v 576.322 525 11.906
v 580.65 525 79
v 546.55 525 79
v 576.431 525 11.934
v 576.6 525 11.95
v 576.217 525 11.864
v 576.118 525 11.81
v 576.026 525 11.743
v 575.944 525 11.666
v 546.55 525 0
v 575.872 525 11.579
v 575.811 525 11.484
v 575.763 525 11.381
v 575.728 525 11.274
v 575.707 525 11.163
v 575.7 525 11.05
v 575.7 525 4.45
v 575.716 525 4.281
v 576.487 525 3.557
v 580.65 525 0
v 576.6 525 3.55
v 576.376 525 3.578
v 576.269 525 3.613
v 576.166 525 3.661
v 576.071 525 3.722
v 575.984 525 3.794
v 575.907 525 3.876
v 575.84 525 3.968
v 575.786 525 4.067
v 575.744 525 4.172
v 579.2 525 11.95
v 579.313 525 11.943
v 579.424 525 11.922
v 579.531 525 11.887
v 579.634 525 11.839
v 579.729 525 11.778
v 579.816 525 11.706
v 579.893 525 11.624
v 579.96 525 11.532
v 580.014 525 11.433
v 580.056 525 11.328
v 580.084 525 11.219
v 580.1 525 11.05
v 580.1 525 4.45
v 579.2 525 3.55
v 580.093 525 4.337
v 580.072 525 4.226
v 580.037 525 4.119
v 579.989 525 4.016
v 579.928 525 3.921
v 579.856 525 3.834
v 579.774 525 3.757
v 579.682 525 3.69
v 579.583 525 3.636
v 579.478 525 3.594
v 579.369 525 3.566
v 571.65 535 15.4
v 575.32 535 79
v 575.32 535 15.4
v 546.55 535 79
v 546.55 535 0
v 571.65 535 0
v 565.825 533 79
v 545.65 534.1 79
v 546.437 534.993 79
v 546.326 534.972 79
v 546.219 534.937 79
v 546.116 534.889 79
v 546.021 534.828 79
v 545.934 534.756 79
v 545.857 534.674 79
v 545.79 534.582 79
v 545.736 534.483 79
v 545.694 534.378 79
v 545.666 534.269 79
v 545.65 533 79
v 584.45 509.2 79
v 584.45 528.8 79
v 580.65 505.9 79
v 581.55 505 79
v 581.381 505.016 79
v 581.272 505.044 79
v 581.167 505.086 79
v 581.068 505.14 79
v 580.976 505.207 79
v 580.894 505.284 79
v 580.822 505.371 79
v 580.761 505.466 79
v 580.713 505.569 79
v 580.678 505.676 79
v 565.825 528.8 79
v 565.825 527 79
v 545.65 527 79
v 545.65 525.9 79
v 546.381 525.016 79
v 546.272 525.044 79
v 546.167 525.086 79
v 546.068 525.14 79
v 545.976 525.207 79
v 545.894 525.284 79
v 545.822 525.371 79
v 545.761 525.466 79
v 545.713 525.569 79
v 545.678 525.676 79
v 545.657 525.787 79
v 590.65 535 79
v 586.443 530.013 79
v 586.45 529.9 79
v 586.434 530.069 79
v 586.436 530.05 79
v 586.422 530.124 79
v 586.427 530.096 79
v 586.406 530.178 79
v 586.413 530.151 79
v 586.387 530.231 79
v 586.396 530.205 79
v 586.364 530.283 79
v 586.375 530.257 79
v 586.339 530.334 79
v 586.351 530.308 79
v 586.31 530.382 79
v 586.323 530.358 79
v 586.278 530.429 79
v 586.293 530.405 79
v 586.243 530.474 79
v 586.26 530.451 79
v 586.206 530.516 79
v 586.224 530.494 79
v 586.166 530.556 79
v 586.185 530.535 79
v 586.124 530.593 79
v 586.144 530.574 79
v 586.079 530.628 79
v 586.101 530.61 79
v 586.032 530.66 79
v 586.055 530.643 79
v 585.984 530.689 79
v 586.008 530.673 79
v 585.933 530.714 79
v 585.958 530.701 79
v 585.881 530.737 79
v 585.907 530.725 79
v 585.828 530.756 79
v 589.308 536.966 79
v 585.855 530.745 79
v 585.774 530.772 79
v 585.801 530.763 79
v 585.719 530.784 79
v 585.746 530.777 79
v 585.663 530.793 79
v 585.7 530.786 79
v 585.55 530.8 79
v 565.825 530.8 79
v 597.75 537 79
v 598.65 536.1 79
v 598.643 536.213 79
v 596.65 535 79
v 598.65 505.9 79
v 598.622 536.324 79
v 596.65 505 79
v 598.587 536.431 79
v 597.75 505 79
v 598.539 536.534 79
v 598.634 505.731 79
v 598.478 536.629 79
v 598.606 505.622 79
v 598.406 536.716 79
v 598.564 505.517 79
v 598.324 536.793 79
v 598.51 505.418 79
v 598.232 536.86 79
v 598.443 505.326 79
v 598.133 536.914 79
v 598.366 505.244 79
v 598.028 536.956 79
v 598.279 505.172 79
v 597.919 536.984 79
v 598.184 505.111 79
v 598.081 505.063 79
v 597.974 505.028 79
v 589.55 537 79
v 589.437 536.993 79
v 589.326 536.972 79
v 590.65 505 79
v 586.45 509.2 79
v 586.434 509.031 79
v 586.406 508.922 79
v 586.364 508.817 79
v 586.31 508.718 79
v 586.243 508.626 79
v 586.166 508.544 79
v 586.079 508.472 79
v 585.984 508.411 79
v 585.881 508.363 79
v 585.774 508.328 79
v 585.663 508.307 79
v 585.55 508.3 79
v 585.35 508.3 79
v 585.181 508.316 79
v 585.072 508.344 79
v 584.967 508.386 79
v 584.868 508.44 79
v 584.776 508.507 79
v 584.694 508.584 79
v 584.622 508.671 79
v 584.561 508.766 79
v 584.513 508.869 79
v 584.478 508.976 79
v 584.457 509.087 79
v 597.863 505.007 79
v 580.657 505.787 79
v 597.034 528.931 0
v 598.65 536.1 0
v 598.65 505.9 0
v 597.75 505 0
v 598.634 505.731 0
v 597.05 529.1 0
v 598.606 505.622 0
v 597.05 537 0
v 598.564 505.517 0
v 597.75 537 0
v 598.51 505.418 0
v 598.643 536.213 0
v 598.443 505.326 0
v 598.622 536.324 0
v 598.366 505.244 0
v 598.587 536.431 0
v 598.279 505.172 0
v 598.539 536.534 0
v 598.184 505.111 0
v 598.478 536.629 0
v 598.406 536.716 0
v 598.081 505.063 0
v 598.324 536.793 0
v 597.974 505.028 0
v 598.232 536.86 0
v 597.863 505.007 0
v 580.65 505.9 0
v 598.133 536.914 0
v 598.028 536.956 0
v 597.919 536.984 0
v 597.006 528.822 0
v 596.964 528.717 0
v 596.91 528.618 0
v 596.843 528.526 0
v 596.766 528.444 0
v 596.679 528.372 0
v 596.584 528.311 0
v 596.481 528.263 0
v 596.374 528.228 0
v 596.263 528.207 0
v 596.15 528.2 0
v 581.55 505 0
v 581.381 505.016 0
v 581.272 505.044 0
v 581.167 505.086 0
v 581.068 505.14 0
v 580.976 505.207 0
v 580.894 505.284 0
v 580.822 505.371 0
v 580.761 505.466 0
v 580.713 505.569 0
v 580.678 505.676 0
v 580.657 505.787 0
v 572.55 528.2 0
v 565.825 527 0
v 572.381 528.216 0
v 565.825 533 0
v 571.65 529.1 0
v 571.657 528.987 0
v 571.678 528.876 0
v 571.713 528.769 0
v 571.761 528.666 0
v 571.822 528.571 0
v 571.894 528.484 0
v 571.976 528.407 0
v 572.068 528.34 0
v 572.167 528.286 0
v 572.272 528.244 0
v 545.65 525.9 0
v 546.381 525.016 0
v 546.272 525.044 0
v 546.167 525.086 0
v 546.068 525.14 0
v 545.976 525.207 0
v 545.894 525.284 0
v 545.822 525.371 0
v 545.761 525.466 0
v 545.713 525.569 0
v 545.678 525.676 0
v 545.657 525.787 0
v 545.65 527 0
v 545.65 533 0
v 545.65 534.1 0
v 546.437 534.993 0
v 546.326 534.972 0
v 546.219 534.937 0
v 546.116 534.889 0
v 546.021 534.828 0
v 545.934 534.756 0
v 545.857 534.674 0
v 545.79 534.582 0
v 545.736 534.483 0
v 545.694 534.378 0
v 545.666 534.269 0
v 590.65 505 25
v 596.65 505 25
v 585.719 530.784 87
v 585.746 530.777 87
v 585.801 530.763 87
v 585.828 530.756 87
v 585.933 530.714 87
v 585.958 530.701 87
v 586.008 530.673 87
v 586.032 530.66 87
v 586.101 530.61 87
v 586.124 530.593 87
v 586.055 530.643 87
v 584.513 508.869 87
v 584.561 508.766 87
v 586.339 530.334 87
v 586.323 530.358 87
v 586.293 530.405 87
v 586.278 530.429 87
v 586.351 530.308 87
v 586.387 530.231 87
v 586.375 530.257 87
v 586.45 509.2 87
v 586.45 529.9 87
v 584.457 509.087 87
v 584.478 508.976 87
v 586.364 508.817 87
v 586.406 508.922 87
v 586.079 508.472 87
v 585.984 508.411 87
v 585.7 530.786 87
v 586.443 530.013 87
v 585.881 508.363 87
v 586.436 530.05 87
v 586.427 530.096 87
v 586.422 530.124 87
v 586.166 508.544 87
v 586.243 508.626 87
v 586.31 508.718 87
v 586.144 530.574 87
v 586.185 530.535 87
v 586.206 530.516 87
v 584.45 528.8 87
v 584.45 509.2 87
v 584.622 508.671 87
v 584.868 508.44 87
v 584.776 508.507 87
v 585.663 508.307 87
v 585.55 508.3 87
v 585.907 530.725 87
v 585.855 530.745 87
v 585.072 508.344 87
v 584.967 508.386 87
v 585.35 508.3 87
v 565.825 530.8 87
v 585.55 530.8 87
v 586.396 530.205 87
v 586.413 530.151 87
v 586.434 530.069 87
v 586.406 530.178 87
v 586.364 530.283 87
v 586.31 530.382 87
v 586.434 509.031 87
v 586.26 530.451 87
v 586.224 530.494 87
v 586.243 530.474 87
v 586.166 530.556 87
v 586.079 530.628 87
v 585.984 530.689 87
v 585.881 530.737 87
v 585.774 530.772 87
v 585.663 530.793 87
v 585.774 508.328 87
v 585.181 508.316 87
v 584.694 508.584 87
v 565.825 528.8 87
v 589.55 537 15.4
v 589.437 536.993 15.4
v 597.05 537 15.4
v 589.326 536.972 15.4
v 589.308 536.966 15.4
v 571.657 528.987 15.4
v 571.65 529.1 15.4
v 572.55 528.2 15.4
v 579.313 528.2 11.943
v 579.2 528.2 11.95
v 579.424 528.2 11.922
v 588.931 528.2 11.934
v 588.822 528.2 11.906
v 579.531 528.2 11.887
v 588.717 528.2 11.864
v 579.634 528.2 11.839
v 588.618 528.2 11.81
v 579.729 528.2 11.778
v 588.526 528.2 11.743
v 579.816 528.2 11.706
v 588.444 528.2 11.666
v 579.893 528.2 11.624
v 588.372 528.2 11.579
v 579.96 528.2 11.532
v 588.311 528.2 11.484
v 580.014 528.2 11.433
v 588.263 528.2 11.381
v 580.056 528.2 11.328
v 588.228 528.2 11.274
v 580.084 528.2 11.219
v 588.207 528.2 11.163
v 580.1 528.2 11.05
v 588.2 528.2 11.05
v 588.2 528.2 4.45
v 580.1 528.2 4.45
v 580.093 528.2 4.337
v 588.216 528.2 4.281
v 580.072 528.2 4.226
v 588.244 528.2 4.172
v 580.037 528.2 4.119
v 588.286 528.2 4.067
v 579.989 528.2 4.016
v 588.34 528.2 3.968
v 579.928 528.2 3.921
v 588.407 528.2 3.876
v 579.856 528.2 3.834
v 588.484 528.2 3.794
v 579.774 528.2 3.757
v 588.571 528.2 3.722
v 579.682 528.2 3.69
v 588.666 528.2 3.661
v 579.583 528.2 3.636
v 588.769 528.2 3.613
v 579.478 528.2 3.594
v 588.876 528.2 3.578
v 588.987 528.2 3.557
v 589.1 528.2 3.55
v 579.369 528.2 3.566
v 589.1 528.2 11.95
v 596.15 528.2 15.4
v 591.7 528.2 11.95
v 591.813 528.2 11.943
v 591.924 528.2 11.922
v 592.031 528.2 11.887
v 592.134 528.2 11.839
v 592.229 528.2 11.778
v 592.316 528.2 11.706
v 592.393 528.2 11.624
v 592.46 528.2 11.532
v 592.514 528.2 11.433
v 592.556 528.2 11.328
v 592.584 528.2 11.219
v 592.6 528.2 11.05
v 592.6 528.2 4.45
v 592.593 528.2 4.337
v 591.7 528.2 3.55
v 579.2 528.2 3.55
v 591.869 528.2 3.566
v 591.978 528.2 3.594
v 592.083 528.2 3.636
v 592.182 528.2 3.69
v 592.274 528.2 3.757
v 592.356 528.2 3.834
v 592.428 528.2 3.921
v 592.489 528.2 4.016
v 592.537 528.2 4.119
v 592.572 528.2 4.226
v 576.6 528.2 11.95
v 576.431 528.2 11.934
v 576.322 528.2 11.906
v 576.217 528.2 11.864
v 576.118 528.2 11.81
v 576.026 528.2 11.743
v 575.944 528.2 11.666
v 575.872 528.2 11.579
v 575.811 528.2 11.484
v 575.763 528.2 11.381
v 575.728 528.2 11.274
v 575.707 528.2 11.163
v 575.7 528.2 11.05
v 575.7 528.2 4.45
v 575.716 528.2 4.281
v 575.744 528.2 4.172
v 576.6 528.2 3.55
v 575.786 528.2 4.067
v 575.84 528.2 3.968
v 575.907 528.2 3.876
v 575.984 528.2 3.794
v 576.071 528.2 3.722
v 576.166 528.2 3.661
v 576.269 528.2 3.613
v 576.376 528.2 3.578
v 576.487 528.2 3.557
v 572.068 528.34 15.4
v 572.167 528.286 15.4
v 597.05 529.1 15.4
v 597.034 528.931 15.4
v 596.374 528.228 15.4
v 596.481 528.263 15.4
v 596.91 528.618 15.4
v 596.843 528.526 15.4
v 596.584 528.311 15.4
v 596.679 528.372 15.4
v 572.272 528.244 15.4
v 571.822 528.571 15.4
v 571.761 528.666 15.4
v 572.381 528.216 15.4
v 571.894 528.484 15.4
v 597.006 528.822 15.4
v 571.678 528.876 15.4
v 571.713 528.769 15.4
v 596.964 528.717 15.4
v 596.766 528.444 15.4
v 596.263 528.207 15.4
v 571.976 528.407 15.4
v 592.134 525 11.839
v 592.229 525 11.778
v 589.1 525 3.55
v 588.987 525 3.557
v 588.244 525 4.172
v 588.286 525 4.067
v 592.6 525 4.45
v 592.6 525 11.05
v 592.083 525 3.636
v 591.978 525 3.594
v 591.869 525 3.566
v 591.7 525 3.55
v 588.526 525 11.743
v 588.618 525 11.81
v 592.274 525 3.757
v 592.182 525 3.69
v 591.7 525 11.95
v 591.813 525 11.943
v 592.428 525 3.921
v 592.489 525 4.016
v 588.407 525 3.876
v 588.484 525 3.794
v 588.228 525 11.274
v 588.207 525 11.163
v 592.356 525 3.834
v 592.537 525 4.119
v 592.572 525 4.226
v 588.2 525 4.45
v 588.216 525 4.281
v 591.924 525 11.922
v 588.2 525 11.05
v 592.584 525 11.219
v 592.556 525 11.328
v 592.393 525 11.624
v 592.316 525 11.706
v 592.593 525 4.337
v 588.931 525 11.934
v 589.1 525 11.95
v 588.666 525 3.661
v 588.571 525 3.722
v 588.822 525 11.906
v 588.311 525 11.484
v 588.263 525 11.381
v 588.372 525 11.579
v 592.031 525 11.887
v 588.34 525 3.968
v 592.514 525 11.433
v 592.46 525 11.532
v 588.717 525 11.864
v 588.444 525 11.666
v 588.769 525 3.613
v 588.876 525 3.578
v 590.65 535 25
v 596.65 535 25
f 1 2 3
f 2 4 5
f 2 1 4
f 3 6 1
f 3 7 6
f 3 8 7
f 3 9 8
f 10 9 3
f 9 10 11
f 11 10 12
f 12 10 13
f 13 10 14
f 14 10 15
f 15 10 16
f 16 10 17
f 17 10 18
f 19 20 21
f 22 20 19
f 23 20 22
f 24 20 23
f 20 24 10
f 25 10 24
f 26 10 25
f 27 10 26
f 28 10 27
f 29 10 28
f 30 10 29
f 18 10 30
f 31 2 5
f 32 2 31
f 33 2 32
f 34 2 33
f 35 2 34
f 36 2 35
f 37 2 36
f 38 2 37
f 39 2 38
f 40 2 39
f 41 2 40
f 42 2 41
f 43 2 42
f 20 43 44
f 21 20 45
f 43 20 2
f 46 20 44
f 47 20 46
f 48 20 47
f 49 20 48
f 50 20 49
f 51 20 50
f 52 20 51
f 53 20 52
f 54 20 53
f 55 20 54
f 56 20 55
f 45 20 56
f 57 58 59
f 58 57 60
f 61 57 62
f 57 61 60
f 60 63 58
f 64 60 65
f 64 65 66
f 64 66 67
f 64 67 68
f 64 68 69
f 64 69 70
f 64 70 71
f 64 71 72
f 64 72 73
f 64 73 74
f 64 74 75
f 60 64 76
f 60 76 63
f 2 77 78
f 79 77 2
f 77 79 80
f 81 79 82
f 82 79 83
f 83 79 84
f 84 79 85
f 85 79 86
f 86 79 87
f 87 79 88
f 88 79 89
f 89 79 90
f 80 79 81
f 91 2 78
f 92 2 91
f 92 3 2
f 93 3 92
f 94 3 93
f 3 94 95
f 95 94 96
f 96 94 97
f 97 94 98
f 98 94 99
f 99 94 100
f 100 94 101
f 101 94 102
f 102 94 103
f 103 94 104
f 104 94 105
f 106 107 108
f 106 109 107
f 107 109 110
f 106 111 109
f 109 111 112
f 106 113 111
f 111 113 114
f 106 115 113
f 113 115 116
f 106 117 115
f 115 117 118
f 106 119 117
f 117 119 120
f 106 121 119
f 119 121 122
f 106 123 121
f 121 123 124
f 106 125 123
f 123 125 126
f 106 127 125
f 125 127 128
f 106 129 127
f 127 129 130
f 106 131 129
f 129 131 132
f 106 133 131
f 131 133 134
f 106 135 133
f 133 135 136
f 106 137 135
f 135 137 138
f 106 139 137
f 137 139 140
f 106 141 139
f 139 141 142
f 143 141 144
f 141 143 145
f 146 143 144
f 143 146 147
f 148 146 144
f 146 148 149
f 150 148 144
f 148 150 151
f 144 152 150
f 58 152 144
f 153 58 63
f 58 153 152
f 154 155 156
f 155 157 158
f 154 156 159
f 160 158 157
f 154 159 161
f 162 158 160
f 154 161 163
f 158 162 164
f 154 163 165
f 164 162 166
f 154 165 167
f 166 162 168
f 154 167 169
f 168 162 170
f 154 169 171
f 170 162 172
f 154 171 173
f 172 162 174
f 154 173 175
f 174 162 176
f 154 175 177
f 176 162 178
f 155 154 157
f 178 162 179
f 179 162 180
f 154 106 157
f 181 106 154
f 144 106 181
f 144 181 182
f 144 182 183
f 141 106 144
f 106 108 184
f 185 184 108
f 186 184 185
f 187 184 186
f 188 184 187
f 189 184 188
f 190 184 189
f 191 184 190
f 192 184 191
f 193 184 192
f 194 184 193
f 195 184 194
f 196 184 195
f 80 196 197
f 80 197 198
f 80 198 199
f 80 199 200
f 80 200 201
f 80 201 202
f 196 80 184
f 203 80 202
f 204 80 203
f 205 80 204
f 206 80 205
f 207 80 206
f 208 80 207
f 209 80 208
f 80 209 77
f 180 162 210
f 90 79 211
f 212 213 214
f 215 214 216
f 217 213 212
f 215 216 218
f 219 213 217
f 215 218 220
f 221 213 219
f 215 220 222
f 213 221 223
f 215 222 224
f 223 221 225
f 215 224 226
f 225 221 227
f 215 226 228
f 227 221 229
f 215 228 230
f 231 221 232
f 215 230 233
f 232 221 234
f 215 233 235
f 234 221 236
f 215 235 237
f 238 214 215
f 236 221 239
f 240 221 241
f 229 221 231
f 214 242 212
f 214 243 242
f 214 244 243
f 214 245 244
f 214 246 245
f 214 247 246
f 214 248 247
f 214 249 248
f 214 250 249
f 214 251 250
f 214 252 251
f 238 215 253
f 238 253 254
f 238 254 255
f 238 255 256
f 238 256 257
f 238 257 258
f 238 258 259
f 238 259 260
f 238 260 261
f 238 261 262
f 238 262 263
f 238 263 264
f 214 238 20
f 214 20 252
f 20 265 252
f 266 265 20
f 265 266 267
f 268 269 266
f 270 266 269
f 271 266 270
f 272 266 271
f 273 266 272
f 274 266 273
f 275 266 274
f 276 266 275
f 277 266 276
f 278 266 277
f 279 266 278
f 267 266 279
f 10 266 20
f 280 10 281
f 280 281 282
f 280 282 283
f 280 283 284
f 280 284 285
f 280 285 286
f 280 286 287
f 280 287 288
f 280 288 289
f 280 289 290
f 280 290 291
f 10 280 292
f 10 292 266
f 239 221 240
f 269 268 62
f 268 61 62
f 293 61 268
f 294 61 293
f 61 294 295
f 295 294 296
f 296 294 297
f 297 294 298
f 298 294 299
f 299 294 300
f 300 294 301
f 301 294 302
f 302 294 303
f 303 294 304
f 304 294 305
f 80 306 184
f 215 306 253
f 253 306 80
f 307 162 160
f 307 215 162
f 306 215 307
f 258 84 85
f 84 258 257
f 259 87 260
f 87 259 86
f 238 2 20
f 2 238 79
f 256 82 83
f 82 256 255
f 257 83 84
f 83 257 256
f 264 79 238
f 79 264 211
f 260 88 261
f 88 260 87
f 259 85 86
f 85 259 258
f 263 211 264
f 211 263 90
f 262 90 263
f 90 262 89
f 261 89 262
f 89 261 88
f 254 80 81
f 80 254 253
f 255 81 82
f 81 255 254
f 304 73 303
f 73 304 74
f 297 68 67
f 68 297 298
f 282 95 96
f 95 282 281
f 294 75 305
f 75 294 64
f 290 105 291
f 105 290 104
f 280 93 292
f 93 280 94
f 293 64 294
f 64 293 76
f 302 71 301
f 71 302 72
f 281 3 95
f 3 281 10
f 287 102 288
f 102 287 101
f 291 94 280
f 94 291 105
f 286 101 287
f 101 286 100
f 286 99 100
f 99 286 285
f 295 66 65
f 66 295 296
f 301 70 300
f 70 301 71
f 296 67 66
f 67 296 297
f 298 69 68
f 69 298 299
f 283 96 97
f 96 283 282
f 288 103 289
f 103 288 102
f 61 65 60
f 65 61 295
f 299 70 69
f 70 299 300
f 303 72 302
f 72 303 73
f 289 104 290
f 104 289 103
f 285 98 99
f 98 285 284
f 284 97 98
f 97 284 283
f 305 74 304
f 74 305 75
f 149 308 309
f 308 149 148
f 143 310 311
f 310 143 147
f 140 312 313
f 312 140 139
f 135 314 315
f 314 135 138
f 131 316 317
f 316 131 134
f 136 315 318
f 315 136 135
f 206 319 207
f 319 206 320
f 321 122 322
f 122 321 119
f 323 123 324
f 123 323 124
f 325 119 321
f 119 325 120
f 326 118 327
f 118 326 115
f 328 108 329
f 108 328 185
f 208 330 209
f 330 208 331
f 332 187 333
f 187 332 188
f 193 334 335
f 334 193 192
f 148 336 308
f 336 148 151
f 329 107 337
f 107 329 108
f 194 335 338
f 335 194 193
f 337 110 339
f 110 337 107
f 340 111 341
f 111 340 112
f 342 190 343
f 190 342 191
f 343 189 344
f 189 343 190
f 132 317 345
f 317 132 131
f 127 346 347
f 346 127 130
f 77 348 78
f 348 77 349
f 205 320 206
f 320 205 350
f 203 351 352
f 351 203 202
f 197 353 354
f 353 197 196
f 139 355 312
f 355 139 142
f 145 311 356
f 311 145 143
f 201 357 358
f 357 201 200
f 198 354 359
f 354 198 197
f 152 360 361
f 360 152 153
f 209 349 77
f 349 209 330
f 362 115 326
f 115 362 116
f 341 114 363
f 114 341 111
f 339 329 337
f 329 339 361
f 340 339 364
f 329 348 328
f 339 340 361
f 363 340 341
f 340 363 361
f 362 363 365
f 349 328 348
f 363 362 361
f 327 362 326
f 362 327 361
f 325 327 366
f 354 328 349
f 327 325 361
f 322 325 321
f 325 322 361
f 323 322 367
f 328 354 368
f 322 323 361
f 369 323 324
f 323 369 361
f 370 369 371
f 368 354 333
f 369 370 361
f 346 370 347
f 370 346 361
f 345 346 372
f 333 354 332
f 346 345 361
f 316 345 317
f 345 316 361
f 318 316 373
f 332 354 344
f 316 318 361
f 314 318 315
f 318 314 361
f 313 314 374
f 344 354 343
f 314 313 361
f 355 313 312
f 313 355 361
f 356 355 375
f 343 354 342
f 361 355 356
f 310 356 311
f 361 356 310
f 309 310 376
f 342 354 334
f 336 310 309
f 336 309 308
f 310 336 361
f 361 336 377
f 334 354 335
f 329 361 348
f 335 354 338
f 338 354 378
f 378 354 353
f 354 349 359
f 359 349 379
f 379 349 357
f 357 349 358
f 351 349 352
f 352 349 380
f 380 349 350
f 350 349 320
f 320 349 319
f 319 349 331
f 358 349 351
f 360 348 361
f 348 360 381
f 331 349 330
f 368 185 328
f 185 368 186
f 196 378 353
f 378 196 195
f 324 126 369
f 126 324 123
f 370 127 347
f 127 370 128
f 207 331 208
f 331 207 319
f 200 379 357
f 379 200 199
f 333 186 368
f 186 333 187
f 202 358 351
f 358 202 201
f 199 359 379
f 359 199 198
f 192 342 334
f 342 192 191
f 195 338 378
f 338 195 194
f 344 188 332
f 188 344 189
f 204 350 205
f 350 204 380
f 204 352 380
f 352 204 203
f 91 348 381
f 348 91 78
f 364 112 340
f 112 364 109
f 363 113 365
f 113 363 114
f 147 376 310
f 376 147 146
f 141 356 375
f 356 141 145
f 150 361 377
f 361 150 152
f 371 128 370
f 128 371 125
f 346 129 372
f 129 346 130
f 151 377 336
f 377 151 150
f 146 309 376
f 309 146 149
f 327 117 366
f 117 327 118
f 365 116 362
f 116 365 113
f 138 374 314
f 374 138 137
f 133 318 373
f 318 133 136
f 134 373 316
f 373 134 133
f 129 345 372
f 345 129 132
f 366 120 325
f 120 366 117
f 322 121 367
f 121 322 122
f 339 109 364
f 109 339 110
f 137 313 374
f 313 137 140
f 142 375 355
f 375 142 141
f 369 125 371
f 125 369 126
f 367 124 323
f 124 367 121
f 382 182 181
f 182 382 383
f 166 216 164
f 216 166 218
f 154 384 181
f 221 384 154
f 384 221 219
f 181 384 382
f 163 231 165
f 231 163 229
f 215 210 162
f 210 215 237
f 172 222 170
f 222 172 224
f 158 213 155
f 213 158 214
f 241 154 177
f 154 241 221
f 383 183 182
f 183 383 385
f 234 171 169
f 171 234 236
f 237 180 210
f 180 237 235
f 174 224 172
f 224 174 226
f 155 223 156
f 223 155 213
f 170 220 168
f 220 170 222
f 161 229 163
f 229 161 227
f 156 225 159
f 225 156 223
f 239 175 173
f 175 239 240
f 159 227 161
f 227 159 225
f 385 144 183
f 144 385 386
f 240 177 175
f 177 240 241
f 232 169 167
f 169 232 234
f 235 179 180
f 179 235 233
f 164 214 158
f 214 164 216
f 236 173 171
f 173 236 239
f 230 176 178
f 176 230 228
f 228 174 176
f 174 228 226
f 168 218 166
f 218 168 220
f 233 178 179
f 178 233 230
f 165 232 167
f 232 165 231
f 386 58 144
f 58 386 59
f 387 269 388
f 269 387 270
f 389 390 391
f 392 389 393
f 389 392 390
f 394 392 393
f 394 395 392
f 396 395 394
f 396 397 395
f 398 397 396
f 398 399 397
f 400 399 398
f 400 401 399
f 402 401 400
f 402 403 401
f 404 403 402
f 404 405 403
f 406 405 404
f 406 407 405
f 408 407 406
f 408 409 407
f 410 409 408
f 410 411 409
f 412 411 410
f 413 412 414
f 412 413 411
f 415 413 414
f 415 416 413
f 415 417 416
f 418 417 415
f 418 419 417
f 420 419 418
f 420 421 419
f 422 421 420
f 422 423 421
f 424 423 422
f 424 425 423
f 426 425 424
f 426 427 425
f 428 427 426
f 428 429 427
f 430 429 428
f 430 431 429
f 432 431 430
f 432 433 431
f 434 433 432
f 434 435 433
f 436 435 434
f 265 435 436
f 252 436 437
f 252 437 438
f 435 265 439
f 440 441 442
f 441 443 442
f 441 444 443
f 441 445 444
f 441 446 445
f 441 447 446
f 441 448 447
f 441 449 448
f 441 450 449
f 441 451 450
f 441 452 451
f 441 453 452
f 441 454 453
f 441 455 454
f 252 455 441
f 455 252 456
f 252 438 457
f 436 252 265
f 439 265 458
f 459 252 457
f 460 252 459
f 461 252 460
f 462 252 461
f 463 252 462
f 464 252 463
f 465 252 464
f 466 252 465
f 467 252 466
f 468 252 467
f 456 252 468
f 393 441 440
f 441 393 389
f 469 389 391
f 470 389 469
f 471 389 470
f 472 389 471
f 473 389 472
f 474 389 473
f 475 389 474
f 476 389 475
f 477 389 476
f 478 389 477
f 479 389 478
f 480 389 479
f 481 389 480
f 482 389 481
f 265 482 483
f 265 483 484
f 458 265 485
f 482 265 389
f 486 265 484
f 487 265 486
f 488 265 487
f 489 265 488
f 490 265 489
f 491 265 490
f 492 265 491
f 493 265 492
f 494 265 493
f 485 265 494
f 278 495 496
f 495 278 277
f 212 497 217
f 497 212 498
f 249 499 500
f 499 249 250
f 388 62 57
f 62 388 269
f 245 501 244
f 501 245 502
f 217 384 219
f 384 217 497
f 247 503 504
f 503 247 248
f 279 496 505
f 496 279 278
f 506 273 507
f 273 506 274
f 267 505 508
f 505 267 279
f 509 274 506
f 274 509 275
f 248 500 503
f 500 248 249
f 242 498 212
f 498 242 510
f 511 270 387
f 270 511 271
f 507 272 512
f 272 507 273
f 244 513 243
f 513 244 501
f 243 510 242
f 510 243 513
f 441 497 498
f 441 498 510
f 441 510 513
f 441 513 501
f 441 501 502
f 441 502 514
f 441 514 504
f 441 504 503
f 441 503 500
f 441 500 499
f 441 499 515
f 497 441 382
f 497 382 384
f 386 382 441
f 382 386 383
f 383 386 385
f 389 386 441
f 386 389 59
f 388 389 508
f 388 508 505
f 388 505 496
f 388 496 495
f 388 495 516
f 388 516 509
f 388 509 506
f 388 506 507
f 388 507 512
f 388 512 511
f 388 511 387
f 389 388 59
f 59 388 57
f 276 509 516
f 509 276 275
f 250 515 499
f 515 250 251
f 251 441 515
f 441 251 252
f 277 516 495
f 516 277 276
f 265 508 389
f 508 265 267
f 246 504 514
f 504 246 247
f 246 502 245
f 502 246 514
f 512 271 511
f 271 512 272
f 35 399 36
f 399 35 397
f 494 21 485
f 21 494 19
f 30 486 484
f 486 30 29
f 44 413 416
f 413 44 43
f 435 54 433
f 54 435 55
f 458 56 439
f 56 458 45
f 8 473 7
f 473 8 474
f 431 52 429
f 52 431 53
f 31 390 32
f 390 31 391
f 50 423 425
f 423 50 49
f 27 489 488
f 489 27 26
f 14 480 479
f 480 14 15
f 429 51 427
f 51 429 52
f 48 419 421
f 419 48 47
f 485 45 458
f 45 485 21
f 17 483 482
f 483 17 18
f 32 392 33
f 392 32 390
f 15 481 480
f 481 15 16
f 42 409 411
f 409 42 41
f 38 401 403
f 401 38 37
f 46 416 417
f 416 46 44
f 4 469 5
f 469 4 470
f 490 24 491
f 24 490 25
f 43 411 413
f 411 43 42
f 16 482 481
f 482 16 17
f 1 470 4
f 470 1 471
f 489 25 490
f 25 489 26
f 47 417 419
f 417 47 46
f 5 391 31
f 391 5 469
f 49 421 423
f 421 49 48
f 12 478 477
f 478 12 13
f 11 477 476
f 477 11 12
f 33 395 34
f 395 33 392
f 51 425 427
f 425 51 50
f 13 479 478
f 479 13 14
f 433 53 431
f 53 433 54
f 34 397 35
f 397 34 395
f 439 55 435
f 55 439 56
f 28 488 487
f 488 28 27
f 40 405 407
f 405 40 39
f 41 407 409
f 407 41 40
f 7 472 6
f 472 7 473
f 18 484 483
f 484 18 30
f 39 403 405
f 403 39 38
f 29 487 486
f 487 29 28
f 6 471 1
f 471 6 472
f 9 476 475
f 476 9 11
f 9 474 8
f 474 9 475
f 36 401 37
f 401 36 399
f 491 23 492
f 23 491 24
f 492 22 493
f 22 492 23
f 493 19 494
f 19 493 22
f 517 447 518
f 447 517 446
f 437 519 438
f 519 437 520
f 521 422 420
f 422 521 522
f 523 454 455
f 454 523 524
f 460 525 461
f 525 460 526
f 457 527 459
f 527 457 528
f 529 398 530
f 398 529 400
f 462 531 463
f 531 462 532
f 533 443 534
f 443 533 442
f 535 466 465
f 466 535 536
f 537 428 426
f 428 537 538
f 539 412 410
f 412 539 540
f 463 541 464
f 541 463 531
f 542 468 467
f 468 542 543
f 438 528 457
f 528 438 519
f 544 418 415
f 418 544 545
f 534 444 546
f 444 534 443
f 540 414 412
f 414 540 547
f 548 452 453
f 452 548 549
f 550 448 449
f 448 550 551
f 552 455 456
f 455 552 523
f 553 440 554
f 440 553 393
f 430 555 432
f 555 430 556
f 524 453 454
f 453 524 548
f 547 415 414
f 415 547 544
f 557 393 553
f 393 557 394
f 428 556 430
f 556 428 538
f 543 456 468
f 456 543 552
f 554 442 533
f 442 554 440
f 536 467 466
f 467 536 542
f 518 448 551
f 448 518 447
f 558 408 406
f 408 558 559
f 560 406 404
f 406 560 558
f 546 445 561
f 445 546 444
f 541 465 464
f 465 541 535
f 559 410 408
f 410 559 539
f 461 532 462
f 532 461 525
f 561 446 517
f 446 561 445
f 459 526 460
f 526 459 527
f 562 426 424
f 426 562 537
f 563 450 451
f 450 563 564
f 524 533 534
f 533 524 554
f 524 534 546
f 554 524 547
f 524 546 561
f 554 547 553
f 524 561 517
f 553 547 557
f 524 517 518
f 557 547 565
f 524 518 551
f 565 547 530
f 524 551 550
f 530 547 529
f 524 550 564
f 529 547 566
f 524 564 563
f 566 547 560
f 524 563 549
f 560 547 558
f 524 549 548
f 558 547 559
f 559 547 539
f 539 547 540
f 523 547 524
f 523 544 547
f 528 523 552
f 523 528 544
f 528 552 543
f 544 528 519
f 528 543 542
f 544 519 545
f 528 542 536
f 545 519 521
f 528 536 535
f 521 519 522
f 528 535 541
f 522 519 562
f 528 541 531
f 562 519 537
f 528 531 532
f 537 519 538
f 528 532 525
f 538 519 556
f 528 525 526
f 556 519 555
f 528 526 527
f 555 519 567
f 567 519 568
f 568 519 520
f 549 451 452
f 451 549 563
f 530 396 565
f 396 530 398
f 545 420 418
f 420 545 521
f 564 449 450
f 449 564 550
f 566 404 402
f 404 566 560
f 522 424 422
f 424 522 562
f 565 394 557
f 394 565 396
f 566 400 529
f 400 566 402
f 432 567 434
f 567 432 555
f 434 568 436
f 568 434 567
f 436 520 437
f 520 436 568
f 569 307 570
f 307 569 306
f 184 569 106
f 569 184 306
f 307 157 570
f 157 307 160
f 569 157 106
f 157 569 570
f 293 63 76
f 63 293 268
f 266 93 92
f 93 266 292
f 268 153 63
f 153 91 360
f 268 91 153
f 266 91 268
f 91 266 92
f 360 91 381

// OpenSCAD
// file: construction.scad
/*
Specialized construction functions specifically for the enclosure.
By combining these operators the various instances of enclosure pieces 
can be constructed.
*/
include <parameters.scad>;
use <utility.scad>;

module lug() {
    ra = knob_diameter/2;
    rb = lug_diameter/2;
    rotate([0,90,90]) 
        rotate_extrude()
            color("DarkSeaGreen")
            polygon([[0,0],[0,lug_height],[rb,lug_height],
                [rb,2.5],[ra,1],[ra,0]]);
}

// extend the corner frame to be symmetrical with the front corner
module extend_frame_x(height=frame_corner_height) {
    union() {
        children();
        color("SteelBlue")
        translate([hinge_inner_diameter*2, hinge_inner_diameter,0]) 
            rotate([0,0,-90])
                frame( hinge_inner_diameter*3+1, 
                    height, hinge_inner_diameter, 
                    corner_roundness );
    }
}

module frame( width, height, thickness, roundness ) {
        linear_extrude(height=height)
            apply_roundness(roundness, $fs =0.01) 
                    square( [thickness, width] );
}

module frame_corner( width, height, thickness, roundness ) {    
    union() {
        mirror([0,1,0]) 
            rotate([0,0,-90])
                frame( width, height, thickness, roundness );
        frame( width, height, thickness + panel_thickness, roundness );
    }   
}

module frame_connector_corner(clearance=0) {
    translate([panel_thickness*1.7,panel_thickness*0.70, 0]) 
        cornerize()
            frame( frame_corner_width*0.75, frame_connector_depth, 
                frame_thickness*.20+clearance, corner_roundness );
        
}

module add_lugs() {   
    union() {
        children();
        translate([lug_offset_x,-lug_height,lug_offset_z]) 
            lug();
        translate([lug_offset_x,-lug_height, lug_offset_z+lug_offset_gap])
            lug(); 
    } 
}

module add_connector(height=frame_corner_height) {
    union() {
        children();

        color("SteelBlue")
        translate([0,0,height])
            frame_connector_corner();
    }
}

module add_hinge_post( top=false ) {
    union() {
        difference() {
            children();

            // create a negative space that snuggly fits the hinge
            translate([frame_corner_width+plastic_thickness+hinge_gap,
                hinge_inner_diameter/2, (top?frame_corner_height:0)])
                mirror(top?[0,0,1]:[0,0,0])
                    union() {
                         height = hinge_height-hinge_inner_diameter;
                        translate([0,0,height/2]) 
                            cube([hinge_inner_diameter+2,
                                hinge_inner_diameter+2,height+1.3],true);
                        // hinge open
                        rotate([0,0,-90]) translate([0,0,-0.1]) scale(1.05) hinge();
                        // hinge closed
                        rotate([0,0,0]) translate([0,0,-0.1]) scale(1.05) hinge();
                    }
            
        }
        color("SteelBlue")
        translate([frame_corner_width+plastic_thickness+hinge_gap,hinge_inner_diameter/2,0])
            cylinder(d=hinge_inner_diameter, frame_corner_height);
    }
}

module add_outside_frame( height ) {
    union() {
        children();
        translate([-plastic_thickness,-plastic_thickness,0])
            color("SteelBlue")
            frame( frame_corner_width+plastic_thickness, height, frame_thickness,
                corner_roundness);
        translate([14.5,0.05,height/2])
            color("SteelBlue")
            rotate([0,0,8])
            cube([frame_corner_width/2,plastic_thickness,height],true);
    }
}

module hinge() {
    height = hinge_height-hinge_inner_diameter;
    width = hinge_inner_diameter+hinge_ring_thickness;
    difference() {
        
        // create the base shape for the hinge
        union() {    
            cylinder(d=width, height);
            
            translate([hinge_inner_diameter*3+hinge_clearance,
                -hinge_offset,height/2-plastic_thickness/2]) 
                cube([hinge_length,hinge_thickness,
                    height+plastic_thickness],true);
           
            translate([2.52,-5.2,height/2]) 
                rotate([0,0,40]) 
                    cube([hinge_inner_diameter,
                        width+1,height],true);
        }
        
        // remove a hole for the hinge post to slide into
        cylinder(d=hinge_inner_diameter+tolerance_smooth, height+1);
        
        // trim the left corner
        translate([4,-17.5,height/2-1]) 
            rotate([0,0,145]) 
                cube([50,width-2,height+3],true);
        
        // smooth the tranistion to the bottom edge
        translate([32,-10,height/2-18.25]) 
            rotate([-88.5,0.1,96]) 
                cube([40,20,60],true);
        
        // add a chamfer to right corner
        translate([hinge_length+8,0,height+25]) 
            rotate([0,45,0]) 
            cube(50,true);
    }   
}

module add_connector_slot() {
    difference() {
        children();
        frame_connector_corner(tolerance_tight);
    }
}

module frame_vertical() {
    add_connector_slot()
    add_connector(frame_vertical_height)
    extend_frame_x(frame_vertical_height)
        frame_corner( frame_corner_width, 
            frame_vertical_height, frame_thickness, 
            corner_roundness );          
}

module grip() {
    rotate([90,90,90])
        color("DarkSeaGreen")
        frame(plastic_thickness,plastic_thickness,plastic_thickness,corner_roundness);
}

module add_snap_lock_slot(top=false) {
    difference() {
        children();
        translate([0,0,top?frame_corner_height+shelf_height:-shelf_height])
            mirror(top?[0,0,1]:[0,0,0])
                 snaplock(tolerance_tight,top);
    }
}

module lug2(clearance) {
    color("DarkSeaGreen")
    rotate([90,0,0])
            frame(frame_connector_depth+clearance,snaplock_connector_size/2,
                connector_thickness+clearance,corner_roundness);
}

module snaplock(clearance=0,top=false) {
    height = shelf_height+snaplock_connector_size+plastic_thickness+clearance;
    union() {
        color("Magenta")
        difference() {
            translate([snaplock_size,-snaplock_thickness*3,-plastic_thickness])
                rotate([0,0,90])
                    frame(snaplock_size+clearance,height,
                        snaplock_width*2+plastic_thickness, corner_roundness);
            fix_preview2() cube([snaplock_size*1.1,snaplock_width+plastic_thickness,shelf_height]);
        }

        // grips at top
        translate([5,1,shelf_height+1.5]) grip();
        translate([18,1,shelf_height+1.5]) grip();

        // grips at bottom
        translate([5,1,0.5]) grip();
        translate([18,1,0.5]) grip();

        // connector lugs
        translate([3*snaplock_size/4-connector_thickness/2-clearance/2,
            frame_connector_depth+snaplock_thickness,
            shelf_height+snaplock_connector_size/2 - (snaplock_connector_size/4)-clearance/2])
            lug2(clearance);

        translate([(top?2:1)*snaplock_size/4-connector_thickness/2-clearance/2,
            frame_connector_depth+snaplock_thickness,
            shelf_height+snaplock_connector_size/2 - (snaplock_connector_size/4)-clearance/2])
            lug2(clearance);
    }
}
// file: support.scad
/*
Provides support objects that are used to model the environment of the enclosure
to ensure the pieces slot together and fit properly.
*/
include <parameters.scad>;
use <utility.scad>;

module wall_panel() {
    cube([panel_height,panel_width,panel_thickness]);
}

module door_panel() {
     cube([door_panel_width,door_panel_height,door_panel_thickness]);
}

module left_wall_panel() {
    translate([panel_thickness,0,panel_offset_z]) 
        rotate([0,-90,0]) 
            wall_panel();
}

module back_wall_panel() {
    translate([(enclosure_width-panel_width)/2,
            enclosure_depth-panel_thickness-plastic_thickness,
            0]) 
        rotate([-90,-90,0]) 
            wall_panel();
}

module right_wall_panel() {
    translate([enclosure_width,0,panel_offset_z]) 
        rotate([0,-90,0]) 
            wall_panel();
}

module left_door(open=false) {
    translate([frame_corner_width+plastic_thickness+hinge_gap,
            hinge_inner_diameter/2,0]) 
        rotate([90,0,open?-90:0]) 
            translate([door_hinge_offset,0,hinge_offset-
                    door_panel_thickness/2])
                door_panel();
}

module right_door(open=false) {
    translate([enclosure_width,0,0])  
        mirror([1,0,0]) left_door(open);
}
// file: utility.scad
/*
Generically useful utility functions.
*/

// applies roundness without altering dimensions of object
module apply_roundness(r)
    offset(r) offset(delta=-r) children(0);

// makes a corner piece by mirroring and rotating one side
module cornerize() {
    union() {
        children(0);
        mirror([0,1,0]) 
            rotate([0,0,-90])
                children(0);
    }
} 

module explode(vector) {
    for(i=[0:$children-1])
        translate(vector*i)
            children(i);

}

/*
 The fix_preview series of functions are used to make small
 translations in order to reduce conincident plane artifacts
 from the preview mode. 

 It would be nice to have just one module for this but I haven't
 figured out a way of doing this generically - so the following
 uses a small translation in different directions depending on
 the use case needed.
*/
module fix_preview() {
    translate($preview?[-0.001,-0.001,-0.001]:[0,0,0])
        children(0);
}

module fix_preview2() {
    translate($preview?[-0.001,0.001,-0.001]:[0,0,0])
        children(0);
}

module fix_preview3() {
    translate($preview?[-0.001,0.001,0.001]:[0,0,0])
        children(0);
}
// file: parameters.scad
$fn=50;

// Wall thickness and tolerance
plastic_thickness=2.0;
tolerance_smooth=0.45;
tolerance_tight=0.40;
corner_roundness=0.9;

// Specify enclosure dimensions
enclosure_height=475.0;
enclosure_depth=535.0;

// Wall panel dimensions
panel_thickness=6.0;
panel_height=450.0;
panel_width=535.0;
panel_offset_z = enclosure_height - panel_height;

// Door panel dimensions
door_panel_thickness=3.0;
door_panel_width=250.0;
door_panel_height=475.0;
door_hinge_offset=6.5;

// Frame
frame_corner_width=30.0;
frame_corner_height=79.0;
frame_thickness = plastic_thickness*2 + panel_thickness;
frame_side = (enclosure_height - frame_corner_height*2)/2;
frame_clip_height=50.5;
frame_vertical_height = (enclosure_height-frame_corner_height*2)/2;
frame_connector_depth = 8.0;

// Lug
knob_diameter=9.8;
lug_diameter=6.2;
lug_gap=1.4;
lug_height = lug_gap+2.15;
lug_offset_x=15.0;
lug_offset_z=27.0;
lug_offset_gap=32;

// Snaplock
shelf_height=50.3+tolerance_tight;
snaplock_width=5+tolerance_tight;
snaplock_size=25;
snaplock_thickness=plastic_thickness;
snaplock_connector_size=15;
connector_thickness=frame_thickness*.4;

// Door hinge
hinge_inner_diameter=10;
hinge_height=25;
hinge_length=53;
hinge_gap = 9.6;
hinge_clearance = 1.5;
hinge_ring_thickness=3.0;
hinge_thickness=plastic_thickness*2 + door_panel_thickness;
hinge_offset=6.5+plastic_thickness;

enclosure_width=2*(frame_corner_width+plastic_thickness+hinge_gap
    +door_hinge_offset) + door_panel_width*2 +tolerance_smooth;
// main file
include <parameters.scad>
use <utility.scad>
use <support.scad>
use <construction.scad>

module back_right_bottom_corner() {
    difference() {
        translate([enclosure_width,enclosure_depth,0])
            mirror([0,1,0])
            mirror([1,0,0])
                add_snap_lock_slot(top=false)
                add_outside_frame(frame_corner_height) 
                add_connector() 
                extend_frame_x()
                    color("SteelBlue")
                    frame_corner( frame_corner_width, 
                        frame_corner_height,frame_thickness,
                        corner_roundness);
                    
        fix_preview2() right_wall_panel();
        fix_preview2() back_wall_panel();
    }
}

%fix_preview2() right_wall_panel();
%fix_preview2() back_wall_panel();
back_right_bottom_corner();
